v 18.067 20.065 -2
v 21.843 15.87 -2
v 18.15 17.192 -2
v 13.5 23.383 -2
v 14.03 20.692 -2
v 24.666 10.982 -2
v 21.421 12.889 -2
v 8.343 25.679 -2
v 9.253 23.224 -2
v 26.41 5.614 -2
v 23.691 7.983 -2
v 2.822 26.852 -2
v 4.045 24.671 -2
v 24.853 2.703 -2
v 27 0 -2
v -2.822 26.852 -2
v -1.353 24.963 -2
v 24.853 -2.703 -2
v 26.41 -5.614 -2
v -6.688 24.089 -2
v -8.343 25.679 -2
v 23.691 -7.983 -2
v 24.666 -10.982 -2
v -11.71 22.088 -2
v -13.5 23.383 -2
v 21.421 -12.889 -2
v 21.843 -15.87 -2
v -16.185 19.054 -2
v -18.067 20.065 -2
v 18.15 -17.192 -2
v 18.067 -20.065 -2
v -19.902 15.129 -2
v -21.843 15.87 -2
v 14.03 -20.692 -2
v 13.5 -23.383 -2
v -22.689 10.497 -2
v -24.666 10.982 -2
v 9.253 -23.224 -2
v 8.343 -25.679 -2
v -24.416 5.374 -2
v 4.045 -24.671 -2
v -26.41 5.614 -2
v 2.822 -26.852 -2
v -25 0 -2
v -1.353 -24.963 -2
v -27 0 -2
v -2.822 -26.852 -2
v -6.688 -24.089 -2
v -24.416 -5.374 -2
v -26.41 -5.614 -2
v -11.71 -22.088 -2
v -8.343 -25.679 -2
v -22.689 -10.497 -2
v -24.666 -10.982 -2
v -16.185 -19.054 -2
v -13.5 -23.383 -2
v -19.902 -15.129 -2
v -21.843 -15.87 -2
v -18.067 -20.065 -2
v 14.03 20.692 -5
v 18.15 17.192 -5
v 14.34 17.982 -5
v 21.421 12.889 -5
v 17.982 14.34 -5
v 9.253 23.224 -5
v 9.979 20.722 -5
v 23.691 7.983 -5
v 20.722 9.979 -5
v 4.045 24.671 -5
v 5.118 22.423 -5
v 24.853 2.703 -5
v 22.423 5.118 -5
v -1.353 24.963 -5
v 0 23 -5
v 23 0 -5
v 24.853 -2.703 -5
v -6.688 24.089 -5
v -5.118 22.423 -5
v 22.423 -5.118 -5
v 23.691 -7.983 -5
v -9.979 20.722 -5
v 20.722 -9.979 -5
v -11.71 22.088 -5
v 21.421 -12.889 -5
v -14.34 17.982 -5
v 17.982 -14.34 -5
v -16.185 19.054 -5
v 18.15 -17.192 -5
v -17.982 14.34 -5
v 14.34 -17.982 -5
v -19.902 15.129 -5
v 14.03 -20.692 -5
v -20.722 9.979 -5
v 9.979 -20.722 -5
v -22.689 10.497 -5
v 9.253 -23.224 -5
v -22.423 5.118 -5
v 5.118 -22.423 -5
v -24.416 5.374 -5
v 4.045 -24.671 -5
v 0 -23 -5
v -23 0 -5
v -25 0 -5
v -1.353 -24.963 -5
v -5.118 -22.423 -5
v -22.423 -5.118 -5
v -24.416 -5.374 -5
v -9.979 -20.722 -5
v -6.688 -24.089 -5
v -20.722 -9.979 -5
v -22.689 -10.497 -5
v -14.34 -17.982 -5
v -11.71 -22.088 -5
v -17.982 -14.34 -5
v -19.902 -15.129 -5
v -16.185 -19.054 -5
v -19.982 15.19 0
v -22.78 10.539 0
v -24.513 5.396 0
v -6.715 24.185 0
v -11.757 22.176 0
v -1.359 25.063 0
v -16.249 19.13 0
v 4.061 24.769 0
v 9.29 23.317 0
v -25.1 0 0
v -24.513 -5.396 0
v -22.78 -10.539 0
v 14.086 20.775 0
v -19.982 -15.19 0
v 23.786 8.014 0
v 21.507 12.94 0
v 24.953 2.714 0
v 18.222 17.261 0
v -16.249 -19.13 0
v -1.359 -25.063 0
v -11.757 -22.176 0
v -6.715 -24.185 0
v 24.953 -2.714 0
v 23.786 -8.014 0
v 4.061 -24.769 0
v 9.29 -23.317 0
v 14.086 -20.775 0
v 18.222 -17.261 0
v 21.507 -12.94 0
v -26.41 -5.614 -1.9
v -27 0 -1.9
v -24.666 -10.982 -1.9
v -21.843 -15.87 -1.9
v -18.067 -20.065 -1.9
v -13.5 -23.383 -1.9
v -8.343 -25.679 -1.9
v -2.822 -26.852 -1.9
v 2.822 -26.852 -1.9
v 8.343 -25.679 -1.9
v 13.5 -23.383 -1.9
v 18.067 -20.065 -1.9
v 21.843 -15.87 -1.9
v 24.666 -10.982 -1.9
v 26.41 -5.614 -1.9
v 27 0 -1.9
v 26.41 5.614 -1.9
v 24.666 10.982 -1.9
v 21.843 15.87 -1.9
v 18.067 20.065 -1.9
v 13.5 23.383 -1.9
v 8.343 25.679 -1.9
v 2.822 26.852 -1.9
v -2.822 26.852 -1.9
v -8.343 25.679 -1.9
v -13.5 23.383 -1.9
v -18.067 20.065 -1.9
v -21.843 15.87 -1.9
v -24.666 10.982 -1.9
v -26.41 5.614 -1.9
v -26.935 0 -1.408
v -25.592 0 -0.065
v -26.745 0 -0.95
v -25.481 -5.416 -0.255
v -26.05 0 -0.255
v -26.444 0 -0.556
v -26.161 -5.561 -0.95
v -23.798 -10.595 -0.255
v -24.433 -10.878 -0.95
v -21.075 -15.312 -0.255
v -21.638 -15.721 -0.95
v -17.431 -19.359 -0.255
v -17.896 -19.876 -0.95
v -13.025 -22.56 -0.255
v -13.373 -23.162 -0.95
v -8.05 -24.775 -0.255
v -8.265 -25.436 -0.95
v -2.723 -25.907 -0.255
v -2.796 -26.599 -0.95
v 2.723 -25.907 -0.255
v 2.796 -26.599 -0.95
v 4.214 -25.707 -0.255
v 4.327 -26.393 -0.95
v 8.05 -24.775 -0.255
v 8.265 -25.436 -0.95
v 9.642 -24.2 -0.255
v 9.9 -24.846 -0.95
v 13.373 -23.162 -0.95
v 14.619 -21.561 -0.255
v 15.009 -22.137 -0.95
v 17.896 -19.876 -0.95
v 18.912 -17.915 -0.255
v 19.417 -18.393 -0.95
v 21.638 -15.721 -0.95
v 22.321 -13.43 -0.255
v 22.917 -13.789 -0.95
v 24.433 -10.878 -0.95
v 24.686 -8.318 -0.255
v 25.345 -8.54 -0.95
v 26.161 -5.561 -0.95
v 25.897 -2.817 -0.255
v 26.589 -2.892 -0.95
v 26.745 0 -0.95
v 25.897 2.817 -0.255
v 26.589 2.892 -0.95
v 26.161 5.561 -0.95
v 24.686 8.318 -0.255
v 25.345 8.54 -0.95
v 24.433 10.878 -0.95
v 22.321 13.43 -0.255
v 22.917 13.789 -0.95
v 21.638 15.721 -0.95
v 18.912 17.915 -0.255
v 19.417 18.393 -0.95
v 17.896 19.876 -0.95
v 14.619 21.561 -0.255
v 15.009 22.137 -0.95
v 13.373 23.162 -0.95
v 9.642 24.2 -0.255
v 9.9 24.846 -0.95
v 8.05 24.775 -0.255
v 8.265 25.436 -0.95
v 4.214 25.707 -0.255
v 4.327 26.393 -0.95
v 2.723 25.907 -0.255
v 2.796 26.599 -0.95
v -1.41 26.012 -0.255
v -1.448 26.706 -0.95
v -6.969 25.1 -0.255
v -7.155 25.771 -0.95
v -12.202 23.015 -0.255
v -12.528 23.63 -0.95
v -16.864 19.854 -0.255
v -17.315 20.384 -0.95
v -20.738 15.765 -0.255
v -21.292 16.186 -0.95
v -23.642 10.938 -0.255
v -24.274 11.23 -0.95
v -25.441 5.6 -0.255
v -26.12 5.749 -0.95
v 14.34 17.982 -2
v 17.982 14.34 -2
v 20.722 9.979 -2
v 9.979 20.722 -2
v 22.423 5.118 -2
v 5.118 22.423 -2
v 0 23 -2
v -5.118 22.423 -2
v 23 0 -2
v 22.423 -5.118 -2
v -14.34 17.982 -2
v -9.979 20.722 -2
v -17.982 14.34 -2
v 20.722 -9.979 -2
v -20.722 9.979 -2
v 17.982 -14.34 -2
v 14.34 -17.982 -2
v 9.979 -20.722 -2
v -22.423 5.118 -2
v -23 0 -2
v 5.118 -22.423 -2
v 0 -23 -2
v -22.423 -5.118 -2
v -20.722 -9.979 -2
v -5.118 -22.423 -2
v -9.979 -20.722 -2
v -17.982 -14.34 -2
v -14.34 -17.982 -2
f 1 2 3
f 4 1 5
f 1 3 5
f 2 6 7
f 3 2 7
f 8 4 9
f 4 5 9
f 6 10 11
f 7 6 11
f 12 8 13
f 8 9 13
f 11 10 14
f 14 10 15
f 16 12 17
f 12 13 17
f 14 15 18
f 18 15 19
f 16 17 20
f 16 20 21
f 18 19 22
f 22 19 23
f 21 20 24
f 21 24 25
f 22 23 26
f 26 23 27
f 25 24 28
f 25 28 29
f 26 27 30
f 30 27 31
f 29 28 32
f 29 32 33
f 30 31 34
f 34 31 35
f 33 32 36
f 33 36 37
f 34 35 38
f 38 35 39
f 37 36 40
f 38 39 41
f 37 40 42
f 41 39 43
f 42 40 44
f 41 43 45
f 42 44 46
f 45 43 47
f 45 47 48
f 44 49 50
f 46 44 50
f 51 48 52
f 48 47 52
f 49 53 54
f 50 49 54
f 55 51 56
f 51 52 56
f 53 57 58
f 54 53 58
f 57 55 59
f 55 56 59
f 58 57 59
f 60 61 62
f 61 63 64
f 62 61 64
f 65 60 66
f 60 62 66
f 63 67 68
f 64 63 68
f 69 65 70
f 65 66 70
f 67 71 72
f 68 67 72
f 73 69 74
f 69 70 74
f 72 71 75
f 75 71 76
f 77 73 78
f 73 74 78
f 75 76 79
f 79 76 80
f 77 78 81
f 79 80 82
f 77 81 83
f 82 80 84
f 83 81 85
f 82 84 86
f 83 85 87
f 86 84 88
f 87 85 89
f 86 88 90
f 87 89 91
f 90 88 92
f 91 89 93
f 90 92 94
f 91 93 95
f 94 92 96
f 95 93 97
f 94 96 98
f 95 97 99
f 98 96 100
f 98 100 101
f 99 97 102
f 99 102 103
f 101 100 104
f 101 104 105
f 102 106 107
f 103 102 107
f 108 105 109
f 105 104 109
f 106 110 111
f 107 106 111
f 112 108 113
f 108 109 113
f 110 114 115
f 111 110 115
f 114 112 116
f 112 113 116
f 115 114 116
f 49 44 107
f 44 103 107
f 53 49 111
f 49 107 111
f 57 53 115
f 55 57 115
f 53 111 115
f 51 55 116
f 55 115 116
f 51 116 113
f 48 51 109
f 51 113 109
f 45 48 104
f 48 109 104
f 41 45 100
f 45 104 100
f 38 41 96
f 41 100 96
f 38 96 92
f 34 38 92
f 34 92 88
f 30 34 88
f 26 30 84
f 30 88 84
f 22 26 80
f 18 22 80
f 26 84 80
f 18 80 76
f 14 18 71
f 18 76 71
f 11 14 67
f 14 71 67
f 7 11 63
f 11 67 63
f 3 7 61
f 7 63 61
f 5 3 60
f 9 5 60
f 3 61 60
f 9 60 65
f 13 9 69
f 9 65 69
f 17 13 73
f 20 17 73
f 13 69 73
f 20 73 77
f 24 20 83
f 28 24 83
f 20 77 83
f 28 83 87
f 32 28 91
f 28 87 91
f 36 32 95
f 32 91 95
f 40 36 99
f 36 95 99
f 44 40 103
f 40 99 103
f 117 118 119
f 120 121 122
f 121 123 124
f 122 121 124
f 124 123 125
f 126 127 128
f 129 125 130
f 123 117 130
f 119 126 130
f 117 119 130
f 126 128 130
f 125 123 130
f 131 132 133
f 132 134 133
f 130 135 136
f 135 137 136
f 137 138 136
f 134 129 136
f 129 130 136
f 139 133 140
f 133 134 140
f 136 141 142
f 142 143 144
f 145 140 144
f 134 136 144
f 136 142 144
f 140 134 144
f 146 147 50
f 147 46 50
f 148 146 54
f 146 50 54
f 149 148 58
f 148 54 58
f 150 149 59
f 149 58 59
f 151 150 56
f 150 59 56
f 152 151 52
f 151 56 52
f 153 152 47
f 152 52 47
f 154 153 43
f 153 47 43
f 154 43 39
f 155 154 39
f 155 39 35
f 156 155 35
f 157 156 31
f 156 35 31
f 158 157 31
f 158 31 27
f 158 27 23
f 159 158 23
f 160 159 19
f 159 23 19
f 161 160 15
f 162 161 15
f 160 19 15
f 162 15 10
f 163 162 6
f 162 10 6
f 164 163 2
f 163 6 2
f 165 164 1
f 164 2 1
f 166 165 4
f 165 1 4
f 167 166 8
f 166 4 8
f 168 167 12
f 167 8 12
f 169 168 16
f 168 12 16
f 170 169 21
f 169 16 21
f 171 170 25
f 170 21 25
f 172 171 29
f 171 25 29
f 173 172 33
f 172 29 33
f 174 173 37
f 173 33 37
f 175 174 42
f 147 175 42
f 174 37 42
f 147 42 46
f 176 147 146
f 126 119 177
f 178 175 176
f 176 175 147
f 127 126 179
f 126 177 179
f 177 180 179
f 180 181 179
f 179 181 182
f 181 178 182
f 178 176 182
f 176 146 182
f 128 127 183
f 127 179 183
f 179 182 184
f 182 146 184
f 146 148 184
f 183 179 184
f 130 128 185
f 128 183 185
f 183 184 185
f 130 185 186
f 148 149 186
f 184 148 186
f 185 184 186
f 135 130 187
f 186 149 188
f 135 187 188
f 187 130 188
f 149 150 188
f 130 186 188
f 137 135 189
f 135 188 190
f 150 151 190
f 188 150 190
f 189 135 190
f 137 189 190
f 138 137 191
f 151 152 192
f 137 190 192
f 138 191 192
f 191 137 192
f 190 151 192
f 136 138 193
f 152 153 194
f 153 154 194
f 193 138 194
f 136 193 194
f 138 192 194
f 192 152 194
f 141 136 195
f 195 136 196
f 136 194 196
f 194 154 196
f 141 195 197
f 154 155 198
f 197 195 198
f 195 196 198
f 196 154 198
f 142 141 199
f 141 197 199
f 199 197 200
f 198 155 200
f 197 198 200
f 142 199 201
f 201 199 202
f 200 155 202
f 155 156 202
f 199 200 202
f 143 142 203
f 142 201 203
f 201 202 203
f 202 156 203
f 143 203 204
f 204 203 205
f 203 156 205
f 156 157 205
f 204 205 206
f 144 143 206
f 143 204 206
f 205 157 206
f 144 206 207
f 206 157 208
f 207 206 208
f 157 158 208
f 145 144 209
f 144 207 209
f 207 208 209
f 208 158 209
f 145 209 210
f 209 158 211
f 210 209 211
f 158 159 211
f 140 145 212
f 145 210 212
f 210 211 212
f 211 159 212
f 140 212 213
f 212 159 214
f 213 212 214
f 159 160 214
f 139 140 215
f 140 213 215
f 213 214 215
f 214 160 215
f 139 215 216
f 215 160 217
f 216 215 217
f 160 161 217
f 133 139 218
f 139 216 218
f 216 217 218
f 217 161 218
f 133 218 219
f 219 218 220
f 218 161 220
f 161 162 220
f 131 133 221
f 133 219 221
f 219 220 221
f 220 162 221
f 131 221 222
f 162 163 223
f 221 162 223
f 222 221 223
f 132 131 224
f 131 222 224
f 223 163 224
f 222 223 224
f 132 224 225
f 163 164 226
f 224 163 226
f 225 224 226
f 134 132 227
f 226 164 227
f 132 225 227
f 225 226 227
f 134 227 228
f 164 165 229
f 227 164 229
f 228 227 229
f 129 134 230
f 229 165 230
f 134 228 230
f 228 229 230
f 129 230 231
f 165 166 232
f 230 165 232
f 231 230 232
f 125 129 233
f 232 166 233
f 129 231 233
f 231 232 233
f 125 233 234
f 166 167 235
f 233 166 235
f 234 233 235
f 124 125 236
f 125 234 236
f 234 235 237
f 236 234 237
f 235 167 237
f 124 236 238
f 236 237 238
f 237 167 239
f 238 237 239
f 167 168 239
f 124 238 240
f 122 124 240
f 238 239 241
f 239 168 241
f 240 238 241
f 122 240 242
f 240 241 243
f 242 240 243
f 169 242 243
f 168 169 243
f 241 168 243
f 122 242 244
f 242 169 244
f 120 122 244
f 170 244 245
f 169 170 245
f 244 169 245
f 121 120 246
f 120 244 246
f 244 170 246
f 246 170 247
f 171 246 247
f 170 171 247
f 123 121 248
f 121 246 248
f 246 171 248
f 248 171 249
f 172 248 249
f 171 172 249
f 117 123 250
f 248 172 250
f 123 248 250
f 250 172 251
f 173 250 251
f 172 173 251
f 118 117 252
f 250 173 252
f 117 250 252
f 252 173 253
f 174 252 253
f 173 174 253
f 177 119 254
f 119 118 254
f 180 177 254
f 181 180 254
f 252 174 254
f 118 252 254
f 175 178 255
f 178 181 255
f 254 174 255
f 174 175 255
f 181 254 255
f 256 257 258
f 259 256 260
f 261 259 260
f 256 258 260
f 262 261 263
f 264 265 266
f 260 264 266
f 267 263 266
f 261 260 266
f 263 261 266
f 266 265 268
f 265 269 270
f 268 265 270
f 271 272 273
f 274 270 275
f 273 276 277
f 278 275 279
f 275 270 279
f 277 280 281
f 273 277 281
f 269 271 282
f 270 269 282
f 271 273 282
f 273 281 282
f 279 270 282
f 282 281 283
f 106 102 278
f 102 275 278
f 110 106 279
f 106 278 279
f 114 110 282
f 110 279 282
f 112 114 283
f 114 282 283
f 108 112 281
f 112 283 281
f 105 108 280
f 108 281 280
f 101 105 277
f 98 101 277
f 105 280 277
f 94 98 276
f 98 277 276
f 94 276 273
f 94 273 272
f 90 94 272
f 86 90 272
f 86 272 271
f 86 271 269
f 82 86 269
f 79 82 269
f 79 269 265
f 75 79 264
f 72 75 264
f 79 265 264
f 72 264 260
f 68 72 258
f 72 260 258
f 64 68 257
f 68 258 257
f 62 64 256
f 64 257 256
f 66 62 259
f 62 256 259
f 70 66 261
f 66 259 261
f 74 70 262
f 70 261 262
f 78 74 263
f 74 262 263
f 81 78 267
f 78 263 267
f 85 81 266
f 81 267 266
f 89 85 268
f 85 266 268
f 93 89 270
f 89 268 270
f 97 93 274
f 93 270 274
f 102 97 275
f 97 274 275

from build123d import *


with BuildPart() as part:
    # Sketch2 → Revolve1 (revolve)
    with BuildSketch(Plane(origin=(0, 0, 0), x_dir=(1, 0, 0), z_dir=(0, 1, 0)), mode=Mode.PRIVATE) as revolve1_sk:
        with BuildLine():
            Line((0, 0), (25.1, 0))
            ThreePointArc((25.1, 0), (26.443502884, 0.556497116), (27, 1.9))
            Line((27, 1.9), (27, 2))
            Line((27, 2), (25, 2))
            Line((25, 2), (25, 5))
            Line((25, 5), (23, 5))
            Line((23, 5), (23, 2))
            Line((23, 2), (0, 2))
            Line((0, 2), (0, 0))
        make_face()
    revolve(revolve1_sk.sketch.rotate(Axis((0, 0, -2), (0, 0, 1)), 180), axis=Axis((0, 0, -2), (0, 0, 1)))


solid = part.part
